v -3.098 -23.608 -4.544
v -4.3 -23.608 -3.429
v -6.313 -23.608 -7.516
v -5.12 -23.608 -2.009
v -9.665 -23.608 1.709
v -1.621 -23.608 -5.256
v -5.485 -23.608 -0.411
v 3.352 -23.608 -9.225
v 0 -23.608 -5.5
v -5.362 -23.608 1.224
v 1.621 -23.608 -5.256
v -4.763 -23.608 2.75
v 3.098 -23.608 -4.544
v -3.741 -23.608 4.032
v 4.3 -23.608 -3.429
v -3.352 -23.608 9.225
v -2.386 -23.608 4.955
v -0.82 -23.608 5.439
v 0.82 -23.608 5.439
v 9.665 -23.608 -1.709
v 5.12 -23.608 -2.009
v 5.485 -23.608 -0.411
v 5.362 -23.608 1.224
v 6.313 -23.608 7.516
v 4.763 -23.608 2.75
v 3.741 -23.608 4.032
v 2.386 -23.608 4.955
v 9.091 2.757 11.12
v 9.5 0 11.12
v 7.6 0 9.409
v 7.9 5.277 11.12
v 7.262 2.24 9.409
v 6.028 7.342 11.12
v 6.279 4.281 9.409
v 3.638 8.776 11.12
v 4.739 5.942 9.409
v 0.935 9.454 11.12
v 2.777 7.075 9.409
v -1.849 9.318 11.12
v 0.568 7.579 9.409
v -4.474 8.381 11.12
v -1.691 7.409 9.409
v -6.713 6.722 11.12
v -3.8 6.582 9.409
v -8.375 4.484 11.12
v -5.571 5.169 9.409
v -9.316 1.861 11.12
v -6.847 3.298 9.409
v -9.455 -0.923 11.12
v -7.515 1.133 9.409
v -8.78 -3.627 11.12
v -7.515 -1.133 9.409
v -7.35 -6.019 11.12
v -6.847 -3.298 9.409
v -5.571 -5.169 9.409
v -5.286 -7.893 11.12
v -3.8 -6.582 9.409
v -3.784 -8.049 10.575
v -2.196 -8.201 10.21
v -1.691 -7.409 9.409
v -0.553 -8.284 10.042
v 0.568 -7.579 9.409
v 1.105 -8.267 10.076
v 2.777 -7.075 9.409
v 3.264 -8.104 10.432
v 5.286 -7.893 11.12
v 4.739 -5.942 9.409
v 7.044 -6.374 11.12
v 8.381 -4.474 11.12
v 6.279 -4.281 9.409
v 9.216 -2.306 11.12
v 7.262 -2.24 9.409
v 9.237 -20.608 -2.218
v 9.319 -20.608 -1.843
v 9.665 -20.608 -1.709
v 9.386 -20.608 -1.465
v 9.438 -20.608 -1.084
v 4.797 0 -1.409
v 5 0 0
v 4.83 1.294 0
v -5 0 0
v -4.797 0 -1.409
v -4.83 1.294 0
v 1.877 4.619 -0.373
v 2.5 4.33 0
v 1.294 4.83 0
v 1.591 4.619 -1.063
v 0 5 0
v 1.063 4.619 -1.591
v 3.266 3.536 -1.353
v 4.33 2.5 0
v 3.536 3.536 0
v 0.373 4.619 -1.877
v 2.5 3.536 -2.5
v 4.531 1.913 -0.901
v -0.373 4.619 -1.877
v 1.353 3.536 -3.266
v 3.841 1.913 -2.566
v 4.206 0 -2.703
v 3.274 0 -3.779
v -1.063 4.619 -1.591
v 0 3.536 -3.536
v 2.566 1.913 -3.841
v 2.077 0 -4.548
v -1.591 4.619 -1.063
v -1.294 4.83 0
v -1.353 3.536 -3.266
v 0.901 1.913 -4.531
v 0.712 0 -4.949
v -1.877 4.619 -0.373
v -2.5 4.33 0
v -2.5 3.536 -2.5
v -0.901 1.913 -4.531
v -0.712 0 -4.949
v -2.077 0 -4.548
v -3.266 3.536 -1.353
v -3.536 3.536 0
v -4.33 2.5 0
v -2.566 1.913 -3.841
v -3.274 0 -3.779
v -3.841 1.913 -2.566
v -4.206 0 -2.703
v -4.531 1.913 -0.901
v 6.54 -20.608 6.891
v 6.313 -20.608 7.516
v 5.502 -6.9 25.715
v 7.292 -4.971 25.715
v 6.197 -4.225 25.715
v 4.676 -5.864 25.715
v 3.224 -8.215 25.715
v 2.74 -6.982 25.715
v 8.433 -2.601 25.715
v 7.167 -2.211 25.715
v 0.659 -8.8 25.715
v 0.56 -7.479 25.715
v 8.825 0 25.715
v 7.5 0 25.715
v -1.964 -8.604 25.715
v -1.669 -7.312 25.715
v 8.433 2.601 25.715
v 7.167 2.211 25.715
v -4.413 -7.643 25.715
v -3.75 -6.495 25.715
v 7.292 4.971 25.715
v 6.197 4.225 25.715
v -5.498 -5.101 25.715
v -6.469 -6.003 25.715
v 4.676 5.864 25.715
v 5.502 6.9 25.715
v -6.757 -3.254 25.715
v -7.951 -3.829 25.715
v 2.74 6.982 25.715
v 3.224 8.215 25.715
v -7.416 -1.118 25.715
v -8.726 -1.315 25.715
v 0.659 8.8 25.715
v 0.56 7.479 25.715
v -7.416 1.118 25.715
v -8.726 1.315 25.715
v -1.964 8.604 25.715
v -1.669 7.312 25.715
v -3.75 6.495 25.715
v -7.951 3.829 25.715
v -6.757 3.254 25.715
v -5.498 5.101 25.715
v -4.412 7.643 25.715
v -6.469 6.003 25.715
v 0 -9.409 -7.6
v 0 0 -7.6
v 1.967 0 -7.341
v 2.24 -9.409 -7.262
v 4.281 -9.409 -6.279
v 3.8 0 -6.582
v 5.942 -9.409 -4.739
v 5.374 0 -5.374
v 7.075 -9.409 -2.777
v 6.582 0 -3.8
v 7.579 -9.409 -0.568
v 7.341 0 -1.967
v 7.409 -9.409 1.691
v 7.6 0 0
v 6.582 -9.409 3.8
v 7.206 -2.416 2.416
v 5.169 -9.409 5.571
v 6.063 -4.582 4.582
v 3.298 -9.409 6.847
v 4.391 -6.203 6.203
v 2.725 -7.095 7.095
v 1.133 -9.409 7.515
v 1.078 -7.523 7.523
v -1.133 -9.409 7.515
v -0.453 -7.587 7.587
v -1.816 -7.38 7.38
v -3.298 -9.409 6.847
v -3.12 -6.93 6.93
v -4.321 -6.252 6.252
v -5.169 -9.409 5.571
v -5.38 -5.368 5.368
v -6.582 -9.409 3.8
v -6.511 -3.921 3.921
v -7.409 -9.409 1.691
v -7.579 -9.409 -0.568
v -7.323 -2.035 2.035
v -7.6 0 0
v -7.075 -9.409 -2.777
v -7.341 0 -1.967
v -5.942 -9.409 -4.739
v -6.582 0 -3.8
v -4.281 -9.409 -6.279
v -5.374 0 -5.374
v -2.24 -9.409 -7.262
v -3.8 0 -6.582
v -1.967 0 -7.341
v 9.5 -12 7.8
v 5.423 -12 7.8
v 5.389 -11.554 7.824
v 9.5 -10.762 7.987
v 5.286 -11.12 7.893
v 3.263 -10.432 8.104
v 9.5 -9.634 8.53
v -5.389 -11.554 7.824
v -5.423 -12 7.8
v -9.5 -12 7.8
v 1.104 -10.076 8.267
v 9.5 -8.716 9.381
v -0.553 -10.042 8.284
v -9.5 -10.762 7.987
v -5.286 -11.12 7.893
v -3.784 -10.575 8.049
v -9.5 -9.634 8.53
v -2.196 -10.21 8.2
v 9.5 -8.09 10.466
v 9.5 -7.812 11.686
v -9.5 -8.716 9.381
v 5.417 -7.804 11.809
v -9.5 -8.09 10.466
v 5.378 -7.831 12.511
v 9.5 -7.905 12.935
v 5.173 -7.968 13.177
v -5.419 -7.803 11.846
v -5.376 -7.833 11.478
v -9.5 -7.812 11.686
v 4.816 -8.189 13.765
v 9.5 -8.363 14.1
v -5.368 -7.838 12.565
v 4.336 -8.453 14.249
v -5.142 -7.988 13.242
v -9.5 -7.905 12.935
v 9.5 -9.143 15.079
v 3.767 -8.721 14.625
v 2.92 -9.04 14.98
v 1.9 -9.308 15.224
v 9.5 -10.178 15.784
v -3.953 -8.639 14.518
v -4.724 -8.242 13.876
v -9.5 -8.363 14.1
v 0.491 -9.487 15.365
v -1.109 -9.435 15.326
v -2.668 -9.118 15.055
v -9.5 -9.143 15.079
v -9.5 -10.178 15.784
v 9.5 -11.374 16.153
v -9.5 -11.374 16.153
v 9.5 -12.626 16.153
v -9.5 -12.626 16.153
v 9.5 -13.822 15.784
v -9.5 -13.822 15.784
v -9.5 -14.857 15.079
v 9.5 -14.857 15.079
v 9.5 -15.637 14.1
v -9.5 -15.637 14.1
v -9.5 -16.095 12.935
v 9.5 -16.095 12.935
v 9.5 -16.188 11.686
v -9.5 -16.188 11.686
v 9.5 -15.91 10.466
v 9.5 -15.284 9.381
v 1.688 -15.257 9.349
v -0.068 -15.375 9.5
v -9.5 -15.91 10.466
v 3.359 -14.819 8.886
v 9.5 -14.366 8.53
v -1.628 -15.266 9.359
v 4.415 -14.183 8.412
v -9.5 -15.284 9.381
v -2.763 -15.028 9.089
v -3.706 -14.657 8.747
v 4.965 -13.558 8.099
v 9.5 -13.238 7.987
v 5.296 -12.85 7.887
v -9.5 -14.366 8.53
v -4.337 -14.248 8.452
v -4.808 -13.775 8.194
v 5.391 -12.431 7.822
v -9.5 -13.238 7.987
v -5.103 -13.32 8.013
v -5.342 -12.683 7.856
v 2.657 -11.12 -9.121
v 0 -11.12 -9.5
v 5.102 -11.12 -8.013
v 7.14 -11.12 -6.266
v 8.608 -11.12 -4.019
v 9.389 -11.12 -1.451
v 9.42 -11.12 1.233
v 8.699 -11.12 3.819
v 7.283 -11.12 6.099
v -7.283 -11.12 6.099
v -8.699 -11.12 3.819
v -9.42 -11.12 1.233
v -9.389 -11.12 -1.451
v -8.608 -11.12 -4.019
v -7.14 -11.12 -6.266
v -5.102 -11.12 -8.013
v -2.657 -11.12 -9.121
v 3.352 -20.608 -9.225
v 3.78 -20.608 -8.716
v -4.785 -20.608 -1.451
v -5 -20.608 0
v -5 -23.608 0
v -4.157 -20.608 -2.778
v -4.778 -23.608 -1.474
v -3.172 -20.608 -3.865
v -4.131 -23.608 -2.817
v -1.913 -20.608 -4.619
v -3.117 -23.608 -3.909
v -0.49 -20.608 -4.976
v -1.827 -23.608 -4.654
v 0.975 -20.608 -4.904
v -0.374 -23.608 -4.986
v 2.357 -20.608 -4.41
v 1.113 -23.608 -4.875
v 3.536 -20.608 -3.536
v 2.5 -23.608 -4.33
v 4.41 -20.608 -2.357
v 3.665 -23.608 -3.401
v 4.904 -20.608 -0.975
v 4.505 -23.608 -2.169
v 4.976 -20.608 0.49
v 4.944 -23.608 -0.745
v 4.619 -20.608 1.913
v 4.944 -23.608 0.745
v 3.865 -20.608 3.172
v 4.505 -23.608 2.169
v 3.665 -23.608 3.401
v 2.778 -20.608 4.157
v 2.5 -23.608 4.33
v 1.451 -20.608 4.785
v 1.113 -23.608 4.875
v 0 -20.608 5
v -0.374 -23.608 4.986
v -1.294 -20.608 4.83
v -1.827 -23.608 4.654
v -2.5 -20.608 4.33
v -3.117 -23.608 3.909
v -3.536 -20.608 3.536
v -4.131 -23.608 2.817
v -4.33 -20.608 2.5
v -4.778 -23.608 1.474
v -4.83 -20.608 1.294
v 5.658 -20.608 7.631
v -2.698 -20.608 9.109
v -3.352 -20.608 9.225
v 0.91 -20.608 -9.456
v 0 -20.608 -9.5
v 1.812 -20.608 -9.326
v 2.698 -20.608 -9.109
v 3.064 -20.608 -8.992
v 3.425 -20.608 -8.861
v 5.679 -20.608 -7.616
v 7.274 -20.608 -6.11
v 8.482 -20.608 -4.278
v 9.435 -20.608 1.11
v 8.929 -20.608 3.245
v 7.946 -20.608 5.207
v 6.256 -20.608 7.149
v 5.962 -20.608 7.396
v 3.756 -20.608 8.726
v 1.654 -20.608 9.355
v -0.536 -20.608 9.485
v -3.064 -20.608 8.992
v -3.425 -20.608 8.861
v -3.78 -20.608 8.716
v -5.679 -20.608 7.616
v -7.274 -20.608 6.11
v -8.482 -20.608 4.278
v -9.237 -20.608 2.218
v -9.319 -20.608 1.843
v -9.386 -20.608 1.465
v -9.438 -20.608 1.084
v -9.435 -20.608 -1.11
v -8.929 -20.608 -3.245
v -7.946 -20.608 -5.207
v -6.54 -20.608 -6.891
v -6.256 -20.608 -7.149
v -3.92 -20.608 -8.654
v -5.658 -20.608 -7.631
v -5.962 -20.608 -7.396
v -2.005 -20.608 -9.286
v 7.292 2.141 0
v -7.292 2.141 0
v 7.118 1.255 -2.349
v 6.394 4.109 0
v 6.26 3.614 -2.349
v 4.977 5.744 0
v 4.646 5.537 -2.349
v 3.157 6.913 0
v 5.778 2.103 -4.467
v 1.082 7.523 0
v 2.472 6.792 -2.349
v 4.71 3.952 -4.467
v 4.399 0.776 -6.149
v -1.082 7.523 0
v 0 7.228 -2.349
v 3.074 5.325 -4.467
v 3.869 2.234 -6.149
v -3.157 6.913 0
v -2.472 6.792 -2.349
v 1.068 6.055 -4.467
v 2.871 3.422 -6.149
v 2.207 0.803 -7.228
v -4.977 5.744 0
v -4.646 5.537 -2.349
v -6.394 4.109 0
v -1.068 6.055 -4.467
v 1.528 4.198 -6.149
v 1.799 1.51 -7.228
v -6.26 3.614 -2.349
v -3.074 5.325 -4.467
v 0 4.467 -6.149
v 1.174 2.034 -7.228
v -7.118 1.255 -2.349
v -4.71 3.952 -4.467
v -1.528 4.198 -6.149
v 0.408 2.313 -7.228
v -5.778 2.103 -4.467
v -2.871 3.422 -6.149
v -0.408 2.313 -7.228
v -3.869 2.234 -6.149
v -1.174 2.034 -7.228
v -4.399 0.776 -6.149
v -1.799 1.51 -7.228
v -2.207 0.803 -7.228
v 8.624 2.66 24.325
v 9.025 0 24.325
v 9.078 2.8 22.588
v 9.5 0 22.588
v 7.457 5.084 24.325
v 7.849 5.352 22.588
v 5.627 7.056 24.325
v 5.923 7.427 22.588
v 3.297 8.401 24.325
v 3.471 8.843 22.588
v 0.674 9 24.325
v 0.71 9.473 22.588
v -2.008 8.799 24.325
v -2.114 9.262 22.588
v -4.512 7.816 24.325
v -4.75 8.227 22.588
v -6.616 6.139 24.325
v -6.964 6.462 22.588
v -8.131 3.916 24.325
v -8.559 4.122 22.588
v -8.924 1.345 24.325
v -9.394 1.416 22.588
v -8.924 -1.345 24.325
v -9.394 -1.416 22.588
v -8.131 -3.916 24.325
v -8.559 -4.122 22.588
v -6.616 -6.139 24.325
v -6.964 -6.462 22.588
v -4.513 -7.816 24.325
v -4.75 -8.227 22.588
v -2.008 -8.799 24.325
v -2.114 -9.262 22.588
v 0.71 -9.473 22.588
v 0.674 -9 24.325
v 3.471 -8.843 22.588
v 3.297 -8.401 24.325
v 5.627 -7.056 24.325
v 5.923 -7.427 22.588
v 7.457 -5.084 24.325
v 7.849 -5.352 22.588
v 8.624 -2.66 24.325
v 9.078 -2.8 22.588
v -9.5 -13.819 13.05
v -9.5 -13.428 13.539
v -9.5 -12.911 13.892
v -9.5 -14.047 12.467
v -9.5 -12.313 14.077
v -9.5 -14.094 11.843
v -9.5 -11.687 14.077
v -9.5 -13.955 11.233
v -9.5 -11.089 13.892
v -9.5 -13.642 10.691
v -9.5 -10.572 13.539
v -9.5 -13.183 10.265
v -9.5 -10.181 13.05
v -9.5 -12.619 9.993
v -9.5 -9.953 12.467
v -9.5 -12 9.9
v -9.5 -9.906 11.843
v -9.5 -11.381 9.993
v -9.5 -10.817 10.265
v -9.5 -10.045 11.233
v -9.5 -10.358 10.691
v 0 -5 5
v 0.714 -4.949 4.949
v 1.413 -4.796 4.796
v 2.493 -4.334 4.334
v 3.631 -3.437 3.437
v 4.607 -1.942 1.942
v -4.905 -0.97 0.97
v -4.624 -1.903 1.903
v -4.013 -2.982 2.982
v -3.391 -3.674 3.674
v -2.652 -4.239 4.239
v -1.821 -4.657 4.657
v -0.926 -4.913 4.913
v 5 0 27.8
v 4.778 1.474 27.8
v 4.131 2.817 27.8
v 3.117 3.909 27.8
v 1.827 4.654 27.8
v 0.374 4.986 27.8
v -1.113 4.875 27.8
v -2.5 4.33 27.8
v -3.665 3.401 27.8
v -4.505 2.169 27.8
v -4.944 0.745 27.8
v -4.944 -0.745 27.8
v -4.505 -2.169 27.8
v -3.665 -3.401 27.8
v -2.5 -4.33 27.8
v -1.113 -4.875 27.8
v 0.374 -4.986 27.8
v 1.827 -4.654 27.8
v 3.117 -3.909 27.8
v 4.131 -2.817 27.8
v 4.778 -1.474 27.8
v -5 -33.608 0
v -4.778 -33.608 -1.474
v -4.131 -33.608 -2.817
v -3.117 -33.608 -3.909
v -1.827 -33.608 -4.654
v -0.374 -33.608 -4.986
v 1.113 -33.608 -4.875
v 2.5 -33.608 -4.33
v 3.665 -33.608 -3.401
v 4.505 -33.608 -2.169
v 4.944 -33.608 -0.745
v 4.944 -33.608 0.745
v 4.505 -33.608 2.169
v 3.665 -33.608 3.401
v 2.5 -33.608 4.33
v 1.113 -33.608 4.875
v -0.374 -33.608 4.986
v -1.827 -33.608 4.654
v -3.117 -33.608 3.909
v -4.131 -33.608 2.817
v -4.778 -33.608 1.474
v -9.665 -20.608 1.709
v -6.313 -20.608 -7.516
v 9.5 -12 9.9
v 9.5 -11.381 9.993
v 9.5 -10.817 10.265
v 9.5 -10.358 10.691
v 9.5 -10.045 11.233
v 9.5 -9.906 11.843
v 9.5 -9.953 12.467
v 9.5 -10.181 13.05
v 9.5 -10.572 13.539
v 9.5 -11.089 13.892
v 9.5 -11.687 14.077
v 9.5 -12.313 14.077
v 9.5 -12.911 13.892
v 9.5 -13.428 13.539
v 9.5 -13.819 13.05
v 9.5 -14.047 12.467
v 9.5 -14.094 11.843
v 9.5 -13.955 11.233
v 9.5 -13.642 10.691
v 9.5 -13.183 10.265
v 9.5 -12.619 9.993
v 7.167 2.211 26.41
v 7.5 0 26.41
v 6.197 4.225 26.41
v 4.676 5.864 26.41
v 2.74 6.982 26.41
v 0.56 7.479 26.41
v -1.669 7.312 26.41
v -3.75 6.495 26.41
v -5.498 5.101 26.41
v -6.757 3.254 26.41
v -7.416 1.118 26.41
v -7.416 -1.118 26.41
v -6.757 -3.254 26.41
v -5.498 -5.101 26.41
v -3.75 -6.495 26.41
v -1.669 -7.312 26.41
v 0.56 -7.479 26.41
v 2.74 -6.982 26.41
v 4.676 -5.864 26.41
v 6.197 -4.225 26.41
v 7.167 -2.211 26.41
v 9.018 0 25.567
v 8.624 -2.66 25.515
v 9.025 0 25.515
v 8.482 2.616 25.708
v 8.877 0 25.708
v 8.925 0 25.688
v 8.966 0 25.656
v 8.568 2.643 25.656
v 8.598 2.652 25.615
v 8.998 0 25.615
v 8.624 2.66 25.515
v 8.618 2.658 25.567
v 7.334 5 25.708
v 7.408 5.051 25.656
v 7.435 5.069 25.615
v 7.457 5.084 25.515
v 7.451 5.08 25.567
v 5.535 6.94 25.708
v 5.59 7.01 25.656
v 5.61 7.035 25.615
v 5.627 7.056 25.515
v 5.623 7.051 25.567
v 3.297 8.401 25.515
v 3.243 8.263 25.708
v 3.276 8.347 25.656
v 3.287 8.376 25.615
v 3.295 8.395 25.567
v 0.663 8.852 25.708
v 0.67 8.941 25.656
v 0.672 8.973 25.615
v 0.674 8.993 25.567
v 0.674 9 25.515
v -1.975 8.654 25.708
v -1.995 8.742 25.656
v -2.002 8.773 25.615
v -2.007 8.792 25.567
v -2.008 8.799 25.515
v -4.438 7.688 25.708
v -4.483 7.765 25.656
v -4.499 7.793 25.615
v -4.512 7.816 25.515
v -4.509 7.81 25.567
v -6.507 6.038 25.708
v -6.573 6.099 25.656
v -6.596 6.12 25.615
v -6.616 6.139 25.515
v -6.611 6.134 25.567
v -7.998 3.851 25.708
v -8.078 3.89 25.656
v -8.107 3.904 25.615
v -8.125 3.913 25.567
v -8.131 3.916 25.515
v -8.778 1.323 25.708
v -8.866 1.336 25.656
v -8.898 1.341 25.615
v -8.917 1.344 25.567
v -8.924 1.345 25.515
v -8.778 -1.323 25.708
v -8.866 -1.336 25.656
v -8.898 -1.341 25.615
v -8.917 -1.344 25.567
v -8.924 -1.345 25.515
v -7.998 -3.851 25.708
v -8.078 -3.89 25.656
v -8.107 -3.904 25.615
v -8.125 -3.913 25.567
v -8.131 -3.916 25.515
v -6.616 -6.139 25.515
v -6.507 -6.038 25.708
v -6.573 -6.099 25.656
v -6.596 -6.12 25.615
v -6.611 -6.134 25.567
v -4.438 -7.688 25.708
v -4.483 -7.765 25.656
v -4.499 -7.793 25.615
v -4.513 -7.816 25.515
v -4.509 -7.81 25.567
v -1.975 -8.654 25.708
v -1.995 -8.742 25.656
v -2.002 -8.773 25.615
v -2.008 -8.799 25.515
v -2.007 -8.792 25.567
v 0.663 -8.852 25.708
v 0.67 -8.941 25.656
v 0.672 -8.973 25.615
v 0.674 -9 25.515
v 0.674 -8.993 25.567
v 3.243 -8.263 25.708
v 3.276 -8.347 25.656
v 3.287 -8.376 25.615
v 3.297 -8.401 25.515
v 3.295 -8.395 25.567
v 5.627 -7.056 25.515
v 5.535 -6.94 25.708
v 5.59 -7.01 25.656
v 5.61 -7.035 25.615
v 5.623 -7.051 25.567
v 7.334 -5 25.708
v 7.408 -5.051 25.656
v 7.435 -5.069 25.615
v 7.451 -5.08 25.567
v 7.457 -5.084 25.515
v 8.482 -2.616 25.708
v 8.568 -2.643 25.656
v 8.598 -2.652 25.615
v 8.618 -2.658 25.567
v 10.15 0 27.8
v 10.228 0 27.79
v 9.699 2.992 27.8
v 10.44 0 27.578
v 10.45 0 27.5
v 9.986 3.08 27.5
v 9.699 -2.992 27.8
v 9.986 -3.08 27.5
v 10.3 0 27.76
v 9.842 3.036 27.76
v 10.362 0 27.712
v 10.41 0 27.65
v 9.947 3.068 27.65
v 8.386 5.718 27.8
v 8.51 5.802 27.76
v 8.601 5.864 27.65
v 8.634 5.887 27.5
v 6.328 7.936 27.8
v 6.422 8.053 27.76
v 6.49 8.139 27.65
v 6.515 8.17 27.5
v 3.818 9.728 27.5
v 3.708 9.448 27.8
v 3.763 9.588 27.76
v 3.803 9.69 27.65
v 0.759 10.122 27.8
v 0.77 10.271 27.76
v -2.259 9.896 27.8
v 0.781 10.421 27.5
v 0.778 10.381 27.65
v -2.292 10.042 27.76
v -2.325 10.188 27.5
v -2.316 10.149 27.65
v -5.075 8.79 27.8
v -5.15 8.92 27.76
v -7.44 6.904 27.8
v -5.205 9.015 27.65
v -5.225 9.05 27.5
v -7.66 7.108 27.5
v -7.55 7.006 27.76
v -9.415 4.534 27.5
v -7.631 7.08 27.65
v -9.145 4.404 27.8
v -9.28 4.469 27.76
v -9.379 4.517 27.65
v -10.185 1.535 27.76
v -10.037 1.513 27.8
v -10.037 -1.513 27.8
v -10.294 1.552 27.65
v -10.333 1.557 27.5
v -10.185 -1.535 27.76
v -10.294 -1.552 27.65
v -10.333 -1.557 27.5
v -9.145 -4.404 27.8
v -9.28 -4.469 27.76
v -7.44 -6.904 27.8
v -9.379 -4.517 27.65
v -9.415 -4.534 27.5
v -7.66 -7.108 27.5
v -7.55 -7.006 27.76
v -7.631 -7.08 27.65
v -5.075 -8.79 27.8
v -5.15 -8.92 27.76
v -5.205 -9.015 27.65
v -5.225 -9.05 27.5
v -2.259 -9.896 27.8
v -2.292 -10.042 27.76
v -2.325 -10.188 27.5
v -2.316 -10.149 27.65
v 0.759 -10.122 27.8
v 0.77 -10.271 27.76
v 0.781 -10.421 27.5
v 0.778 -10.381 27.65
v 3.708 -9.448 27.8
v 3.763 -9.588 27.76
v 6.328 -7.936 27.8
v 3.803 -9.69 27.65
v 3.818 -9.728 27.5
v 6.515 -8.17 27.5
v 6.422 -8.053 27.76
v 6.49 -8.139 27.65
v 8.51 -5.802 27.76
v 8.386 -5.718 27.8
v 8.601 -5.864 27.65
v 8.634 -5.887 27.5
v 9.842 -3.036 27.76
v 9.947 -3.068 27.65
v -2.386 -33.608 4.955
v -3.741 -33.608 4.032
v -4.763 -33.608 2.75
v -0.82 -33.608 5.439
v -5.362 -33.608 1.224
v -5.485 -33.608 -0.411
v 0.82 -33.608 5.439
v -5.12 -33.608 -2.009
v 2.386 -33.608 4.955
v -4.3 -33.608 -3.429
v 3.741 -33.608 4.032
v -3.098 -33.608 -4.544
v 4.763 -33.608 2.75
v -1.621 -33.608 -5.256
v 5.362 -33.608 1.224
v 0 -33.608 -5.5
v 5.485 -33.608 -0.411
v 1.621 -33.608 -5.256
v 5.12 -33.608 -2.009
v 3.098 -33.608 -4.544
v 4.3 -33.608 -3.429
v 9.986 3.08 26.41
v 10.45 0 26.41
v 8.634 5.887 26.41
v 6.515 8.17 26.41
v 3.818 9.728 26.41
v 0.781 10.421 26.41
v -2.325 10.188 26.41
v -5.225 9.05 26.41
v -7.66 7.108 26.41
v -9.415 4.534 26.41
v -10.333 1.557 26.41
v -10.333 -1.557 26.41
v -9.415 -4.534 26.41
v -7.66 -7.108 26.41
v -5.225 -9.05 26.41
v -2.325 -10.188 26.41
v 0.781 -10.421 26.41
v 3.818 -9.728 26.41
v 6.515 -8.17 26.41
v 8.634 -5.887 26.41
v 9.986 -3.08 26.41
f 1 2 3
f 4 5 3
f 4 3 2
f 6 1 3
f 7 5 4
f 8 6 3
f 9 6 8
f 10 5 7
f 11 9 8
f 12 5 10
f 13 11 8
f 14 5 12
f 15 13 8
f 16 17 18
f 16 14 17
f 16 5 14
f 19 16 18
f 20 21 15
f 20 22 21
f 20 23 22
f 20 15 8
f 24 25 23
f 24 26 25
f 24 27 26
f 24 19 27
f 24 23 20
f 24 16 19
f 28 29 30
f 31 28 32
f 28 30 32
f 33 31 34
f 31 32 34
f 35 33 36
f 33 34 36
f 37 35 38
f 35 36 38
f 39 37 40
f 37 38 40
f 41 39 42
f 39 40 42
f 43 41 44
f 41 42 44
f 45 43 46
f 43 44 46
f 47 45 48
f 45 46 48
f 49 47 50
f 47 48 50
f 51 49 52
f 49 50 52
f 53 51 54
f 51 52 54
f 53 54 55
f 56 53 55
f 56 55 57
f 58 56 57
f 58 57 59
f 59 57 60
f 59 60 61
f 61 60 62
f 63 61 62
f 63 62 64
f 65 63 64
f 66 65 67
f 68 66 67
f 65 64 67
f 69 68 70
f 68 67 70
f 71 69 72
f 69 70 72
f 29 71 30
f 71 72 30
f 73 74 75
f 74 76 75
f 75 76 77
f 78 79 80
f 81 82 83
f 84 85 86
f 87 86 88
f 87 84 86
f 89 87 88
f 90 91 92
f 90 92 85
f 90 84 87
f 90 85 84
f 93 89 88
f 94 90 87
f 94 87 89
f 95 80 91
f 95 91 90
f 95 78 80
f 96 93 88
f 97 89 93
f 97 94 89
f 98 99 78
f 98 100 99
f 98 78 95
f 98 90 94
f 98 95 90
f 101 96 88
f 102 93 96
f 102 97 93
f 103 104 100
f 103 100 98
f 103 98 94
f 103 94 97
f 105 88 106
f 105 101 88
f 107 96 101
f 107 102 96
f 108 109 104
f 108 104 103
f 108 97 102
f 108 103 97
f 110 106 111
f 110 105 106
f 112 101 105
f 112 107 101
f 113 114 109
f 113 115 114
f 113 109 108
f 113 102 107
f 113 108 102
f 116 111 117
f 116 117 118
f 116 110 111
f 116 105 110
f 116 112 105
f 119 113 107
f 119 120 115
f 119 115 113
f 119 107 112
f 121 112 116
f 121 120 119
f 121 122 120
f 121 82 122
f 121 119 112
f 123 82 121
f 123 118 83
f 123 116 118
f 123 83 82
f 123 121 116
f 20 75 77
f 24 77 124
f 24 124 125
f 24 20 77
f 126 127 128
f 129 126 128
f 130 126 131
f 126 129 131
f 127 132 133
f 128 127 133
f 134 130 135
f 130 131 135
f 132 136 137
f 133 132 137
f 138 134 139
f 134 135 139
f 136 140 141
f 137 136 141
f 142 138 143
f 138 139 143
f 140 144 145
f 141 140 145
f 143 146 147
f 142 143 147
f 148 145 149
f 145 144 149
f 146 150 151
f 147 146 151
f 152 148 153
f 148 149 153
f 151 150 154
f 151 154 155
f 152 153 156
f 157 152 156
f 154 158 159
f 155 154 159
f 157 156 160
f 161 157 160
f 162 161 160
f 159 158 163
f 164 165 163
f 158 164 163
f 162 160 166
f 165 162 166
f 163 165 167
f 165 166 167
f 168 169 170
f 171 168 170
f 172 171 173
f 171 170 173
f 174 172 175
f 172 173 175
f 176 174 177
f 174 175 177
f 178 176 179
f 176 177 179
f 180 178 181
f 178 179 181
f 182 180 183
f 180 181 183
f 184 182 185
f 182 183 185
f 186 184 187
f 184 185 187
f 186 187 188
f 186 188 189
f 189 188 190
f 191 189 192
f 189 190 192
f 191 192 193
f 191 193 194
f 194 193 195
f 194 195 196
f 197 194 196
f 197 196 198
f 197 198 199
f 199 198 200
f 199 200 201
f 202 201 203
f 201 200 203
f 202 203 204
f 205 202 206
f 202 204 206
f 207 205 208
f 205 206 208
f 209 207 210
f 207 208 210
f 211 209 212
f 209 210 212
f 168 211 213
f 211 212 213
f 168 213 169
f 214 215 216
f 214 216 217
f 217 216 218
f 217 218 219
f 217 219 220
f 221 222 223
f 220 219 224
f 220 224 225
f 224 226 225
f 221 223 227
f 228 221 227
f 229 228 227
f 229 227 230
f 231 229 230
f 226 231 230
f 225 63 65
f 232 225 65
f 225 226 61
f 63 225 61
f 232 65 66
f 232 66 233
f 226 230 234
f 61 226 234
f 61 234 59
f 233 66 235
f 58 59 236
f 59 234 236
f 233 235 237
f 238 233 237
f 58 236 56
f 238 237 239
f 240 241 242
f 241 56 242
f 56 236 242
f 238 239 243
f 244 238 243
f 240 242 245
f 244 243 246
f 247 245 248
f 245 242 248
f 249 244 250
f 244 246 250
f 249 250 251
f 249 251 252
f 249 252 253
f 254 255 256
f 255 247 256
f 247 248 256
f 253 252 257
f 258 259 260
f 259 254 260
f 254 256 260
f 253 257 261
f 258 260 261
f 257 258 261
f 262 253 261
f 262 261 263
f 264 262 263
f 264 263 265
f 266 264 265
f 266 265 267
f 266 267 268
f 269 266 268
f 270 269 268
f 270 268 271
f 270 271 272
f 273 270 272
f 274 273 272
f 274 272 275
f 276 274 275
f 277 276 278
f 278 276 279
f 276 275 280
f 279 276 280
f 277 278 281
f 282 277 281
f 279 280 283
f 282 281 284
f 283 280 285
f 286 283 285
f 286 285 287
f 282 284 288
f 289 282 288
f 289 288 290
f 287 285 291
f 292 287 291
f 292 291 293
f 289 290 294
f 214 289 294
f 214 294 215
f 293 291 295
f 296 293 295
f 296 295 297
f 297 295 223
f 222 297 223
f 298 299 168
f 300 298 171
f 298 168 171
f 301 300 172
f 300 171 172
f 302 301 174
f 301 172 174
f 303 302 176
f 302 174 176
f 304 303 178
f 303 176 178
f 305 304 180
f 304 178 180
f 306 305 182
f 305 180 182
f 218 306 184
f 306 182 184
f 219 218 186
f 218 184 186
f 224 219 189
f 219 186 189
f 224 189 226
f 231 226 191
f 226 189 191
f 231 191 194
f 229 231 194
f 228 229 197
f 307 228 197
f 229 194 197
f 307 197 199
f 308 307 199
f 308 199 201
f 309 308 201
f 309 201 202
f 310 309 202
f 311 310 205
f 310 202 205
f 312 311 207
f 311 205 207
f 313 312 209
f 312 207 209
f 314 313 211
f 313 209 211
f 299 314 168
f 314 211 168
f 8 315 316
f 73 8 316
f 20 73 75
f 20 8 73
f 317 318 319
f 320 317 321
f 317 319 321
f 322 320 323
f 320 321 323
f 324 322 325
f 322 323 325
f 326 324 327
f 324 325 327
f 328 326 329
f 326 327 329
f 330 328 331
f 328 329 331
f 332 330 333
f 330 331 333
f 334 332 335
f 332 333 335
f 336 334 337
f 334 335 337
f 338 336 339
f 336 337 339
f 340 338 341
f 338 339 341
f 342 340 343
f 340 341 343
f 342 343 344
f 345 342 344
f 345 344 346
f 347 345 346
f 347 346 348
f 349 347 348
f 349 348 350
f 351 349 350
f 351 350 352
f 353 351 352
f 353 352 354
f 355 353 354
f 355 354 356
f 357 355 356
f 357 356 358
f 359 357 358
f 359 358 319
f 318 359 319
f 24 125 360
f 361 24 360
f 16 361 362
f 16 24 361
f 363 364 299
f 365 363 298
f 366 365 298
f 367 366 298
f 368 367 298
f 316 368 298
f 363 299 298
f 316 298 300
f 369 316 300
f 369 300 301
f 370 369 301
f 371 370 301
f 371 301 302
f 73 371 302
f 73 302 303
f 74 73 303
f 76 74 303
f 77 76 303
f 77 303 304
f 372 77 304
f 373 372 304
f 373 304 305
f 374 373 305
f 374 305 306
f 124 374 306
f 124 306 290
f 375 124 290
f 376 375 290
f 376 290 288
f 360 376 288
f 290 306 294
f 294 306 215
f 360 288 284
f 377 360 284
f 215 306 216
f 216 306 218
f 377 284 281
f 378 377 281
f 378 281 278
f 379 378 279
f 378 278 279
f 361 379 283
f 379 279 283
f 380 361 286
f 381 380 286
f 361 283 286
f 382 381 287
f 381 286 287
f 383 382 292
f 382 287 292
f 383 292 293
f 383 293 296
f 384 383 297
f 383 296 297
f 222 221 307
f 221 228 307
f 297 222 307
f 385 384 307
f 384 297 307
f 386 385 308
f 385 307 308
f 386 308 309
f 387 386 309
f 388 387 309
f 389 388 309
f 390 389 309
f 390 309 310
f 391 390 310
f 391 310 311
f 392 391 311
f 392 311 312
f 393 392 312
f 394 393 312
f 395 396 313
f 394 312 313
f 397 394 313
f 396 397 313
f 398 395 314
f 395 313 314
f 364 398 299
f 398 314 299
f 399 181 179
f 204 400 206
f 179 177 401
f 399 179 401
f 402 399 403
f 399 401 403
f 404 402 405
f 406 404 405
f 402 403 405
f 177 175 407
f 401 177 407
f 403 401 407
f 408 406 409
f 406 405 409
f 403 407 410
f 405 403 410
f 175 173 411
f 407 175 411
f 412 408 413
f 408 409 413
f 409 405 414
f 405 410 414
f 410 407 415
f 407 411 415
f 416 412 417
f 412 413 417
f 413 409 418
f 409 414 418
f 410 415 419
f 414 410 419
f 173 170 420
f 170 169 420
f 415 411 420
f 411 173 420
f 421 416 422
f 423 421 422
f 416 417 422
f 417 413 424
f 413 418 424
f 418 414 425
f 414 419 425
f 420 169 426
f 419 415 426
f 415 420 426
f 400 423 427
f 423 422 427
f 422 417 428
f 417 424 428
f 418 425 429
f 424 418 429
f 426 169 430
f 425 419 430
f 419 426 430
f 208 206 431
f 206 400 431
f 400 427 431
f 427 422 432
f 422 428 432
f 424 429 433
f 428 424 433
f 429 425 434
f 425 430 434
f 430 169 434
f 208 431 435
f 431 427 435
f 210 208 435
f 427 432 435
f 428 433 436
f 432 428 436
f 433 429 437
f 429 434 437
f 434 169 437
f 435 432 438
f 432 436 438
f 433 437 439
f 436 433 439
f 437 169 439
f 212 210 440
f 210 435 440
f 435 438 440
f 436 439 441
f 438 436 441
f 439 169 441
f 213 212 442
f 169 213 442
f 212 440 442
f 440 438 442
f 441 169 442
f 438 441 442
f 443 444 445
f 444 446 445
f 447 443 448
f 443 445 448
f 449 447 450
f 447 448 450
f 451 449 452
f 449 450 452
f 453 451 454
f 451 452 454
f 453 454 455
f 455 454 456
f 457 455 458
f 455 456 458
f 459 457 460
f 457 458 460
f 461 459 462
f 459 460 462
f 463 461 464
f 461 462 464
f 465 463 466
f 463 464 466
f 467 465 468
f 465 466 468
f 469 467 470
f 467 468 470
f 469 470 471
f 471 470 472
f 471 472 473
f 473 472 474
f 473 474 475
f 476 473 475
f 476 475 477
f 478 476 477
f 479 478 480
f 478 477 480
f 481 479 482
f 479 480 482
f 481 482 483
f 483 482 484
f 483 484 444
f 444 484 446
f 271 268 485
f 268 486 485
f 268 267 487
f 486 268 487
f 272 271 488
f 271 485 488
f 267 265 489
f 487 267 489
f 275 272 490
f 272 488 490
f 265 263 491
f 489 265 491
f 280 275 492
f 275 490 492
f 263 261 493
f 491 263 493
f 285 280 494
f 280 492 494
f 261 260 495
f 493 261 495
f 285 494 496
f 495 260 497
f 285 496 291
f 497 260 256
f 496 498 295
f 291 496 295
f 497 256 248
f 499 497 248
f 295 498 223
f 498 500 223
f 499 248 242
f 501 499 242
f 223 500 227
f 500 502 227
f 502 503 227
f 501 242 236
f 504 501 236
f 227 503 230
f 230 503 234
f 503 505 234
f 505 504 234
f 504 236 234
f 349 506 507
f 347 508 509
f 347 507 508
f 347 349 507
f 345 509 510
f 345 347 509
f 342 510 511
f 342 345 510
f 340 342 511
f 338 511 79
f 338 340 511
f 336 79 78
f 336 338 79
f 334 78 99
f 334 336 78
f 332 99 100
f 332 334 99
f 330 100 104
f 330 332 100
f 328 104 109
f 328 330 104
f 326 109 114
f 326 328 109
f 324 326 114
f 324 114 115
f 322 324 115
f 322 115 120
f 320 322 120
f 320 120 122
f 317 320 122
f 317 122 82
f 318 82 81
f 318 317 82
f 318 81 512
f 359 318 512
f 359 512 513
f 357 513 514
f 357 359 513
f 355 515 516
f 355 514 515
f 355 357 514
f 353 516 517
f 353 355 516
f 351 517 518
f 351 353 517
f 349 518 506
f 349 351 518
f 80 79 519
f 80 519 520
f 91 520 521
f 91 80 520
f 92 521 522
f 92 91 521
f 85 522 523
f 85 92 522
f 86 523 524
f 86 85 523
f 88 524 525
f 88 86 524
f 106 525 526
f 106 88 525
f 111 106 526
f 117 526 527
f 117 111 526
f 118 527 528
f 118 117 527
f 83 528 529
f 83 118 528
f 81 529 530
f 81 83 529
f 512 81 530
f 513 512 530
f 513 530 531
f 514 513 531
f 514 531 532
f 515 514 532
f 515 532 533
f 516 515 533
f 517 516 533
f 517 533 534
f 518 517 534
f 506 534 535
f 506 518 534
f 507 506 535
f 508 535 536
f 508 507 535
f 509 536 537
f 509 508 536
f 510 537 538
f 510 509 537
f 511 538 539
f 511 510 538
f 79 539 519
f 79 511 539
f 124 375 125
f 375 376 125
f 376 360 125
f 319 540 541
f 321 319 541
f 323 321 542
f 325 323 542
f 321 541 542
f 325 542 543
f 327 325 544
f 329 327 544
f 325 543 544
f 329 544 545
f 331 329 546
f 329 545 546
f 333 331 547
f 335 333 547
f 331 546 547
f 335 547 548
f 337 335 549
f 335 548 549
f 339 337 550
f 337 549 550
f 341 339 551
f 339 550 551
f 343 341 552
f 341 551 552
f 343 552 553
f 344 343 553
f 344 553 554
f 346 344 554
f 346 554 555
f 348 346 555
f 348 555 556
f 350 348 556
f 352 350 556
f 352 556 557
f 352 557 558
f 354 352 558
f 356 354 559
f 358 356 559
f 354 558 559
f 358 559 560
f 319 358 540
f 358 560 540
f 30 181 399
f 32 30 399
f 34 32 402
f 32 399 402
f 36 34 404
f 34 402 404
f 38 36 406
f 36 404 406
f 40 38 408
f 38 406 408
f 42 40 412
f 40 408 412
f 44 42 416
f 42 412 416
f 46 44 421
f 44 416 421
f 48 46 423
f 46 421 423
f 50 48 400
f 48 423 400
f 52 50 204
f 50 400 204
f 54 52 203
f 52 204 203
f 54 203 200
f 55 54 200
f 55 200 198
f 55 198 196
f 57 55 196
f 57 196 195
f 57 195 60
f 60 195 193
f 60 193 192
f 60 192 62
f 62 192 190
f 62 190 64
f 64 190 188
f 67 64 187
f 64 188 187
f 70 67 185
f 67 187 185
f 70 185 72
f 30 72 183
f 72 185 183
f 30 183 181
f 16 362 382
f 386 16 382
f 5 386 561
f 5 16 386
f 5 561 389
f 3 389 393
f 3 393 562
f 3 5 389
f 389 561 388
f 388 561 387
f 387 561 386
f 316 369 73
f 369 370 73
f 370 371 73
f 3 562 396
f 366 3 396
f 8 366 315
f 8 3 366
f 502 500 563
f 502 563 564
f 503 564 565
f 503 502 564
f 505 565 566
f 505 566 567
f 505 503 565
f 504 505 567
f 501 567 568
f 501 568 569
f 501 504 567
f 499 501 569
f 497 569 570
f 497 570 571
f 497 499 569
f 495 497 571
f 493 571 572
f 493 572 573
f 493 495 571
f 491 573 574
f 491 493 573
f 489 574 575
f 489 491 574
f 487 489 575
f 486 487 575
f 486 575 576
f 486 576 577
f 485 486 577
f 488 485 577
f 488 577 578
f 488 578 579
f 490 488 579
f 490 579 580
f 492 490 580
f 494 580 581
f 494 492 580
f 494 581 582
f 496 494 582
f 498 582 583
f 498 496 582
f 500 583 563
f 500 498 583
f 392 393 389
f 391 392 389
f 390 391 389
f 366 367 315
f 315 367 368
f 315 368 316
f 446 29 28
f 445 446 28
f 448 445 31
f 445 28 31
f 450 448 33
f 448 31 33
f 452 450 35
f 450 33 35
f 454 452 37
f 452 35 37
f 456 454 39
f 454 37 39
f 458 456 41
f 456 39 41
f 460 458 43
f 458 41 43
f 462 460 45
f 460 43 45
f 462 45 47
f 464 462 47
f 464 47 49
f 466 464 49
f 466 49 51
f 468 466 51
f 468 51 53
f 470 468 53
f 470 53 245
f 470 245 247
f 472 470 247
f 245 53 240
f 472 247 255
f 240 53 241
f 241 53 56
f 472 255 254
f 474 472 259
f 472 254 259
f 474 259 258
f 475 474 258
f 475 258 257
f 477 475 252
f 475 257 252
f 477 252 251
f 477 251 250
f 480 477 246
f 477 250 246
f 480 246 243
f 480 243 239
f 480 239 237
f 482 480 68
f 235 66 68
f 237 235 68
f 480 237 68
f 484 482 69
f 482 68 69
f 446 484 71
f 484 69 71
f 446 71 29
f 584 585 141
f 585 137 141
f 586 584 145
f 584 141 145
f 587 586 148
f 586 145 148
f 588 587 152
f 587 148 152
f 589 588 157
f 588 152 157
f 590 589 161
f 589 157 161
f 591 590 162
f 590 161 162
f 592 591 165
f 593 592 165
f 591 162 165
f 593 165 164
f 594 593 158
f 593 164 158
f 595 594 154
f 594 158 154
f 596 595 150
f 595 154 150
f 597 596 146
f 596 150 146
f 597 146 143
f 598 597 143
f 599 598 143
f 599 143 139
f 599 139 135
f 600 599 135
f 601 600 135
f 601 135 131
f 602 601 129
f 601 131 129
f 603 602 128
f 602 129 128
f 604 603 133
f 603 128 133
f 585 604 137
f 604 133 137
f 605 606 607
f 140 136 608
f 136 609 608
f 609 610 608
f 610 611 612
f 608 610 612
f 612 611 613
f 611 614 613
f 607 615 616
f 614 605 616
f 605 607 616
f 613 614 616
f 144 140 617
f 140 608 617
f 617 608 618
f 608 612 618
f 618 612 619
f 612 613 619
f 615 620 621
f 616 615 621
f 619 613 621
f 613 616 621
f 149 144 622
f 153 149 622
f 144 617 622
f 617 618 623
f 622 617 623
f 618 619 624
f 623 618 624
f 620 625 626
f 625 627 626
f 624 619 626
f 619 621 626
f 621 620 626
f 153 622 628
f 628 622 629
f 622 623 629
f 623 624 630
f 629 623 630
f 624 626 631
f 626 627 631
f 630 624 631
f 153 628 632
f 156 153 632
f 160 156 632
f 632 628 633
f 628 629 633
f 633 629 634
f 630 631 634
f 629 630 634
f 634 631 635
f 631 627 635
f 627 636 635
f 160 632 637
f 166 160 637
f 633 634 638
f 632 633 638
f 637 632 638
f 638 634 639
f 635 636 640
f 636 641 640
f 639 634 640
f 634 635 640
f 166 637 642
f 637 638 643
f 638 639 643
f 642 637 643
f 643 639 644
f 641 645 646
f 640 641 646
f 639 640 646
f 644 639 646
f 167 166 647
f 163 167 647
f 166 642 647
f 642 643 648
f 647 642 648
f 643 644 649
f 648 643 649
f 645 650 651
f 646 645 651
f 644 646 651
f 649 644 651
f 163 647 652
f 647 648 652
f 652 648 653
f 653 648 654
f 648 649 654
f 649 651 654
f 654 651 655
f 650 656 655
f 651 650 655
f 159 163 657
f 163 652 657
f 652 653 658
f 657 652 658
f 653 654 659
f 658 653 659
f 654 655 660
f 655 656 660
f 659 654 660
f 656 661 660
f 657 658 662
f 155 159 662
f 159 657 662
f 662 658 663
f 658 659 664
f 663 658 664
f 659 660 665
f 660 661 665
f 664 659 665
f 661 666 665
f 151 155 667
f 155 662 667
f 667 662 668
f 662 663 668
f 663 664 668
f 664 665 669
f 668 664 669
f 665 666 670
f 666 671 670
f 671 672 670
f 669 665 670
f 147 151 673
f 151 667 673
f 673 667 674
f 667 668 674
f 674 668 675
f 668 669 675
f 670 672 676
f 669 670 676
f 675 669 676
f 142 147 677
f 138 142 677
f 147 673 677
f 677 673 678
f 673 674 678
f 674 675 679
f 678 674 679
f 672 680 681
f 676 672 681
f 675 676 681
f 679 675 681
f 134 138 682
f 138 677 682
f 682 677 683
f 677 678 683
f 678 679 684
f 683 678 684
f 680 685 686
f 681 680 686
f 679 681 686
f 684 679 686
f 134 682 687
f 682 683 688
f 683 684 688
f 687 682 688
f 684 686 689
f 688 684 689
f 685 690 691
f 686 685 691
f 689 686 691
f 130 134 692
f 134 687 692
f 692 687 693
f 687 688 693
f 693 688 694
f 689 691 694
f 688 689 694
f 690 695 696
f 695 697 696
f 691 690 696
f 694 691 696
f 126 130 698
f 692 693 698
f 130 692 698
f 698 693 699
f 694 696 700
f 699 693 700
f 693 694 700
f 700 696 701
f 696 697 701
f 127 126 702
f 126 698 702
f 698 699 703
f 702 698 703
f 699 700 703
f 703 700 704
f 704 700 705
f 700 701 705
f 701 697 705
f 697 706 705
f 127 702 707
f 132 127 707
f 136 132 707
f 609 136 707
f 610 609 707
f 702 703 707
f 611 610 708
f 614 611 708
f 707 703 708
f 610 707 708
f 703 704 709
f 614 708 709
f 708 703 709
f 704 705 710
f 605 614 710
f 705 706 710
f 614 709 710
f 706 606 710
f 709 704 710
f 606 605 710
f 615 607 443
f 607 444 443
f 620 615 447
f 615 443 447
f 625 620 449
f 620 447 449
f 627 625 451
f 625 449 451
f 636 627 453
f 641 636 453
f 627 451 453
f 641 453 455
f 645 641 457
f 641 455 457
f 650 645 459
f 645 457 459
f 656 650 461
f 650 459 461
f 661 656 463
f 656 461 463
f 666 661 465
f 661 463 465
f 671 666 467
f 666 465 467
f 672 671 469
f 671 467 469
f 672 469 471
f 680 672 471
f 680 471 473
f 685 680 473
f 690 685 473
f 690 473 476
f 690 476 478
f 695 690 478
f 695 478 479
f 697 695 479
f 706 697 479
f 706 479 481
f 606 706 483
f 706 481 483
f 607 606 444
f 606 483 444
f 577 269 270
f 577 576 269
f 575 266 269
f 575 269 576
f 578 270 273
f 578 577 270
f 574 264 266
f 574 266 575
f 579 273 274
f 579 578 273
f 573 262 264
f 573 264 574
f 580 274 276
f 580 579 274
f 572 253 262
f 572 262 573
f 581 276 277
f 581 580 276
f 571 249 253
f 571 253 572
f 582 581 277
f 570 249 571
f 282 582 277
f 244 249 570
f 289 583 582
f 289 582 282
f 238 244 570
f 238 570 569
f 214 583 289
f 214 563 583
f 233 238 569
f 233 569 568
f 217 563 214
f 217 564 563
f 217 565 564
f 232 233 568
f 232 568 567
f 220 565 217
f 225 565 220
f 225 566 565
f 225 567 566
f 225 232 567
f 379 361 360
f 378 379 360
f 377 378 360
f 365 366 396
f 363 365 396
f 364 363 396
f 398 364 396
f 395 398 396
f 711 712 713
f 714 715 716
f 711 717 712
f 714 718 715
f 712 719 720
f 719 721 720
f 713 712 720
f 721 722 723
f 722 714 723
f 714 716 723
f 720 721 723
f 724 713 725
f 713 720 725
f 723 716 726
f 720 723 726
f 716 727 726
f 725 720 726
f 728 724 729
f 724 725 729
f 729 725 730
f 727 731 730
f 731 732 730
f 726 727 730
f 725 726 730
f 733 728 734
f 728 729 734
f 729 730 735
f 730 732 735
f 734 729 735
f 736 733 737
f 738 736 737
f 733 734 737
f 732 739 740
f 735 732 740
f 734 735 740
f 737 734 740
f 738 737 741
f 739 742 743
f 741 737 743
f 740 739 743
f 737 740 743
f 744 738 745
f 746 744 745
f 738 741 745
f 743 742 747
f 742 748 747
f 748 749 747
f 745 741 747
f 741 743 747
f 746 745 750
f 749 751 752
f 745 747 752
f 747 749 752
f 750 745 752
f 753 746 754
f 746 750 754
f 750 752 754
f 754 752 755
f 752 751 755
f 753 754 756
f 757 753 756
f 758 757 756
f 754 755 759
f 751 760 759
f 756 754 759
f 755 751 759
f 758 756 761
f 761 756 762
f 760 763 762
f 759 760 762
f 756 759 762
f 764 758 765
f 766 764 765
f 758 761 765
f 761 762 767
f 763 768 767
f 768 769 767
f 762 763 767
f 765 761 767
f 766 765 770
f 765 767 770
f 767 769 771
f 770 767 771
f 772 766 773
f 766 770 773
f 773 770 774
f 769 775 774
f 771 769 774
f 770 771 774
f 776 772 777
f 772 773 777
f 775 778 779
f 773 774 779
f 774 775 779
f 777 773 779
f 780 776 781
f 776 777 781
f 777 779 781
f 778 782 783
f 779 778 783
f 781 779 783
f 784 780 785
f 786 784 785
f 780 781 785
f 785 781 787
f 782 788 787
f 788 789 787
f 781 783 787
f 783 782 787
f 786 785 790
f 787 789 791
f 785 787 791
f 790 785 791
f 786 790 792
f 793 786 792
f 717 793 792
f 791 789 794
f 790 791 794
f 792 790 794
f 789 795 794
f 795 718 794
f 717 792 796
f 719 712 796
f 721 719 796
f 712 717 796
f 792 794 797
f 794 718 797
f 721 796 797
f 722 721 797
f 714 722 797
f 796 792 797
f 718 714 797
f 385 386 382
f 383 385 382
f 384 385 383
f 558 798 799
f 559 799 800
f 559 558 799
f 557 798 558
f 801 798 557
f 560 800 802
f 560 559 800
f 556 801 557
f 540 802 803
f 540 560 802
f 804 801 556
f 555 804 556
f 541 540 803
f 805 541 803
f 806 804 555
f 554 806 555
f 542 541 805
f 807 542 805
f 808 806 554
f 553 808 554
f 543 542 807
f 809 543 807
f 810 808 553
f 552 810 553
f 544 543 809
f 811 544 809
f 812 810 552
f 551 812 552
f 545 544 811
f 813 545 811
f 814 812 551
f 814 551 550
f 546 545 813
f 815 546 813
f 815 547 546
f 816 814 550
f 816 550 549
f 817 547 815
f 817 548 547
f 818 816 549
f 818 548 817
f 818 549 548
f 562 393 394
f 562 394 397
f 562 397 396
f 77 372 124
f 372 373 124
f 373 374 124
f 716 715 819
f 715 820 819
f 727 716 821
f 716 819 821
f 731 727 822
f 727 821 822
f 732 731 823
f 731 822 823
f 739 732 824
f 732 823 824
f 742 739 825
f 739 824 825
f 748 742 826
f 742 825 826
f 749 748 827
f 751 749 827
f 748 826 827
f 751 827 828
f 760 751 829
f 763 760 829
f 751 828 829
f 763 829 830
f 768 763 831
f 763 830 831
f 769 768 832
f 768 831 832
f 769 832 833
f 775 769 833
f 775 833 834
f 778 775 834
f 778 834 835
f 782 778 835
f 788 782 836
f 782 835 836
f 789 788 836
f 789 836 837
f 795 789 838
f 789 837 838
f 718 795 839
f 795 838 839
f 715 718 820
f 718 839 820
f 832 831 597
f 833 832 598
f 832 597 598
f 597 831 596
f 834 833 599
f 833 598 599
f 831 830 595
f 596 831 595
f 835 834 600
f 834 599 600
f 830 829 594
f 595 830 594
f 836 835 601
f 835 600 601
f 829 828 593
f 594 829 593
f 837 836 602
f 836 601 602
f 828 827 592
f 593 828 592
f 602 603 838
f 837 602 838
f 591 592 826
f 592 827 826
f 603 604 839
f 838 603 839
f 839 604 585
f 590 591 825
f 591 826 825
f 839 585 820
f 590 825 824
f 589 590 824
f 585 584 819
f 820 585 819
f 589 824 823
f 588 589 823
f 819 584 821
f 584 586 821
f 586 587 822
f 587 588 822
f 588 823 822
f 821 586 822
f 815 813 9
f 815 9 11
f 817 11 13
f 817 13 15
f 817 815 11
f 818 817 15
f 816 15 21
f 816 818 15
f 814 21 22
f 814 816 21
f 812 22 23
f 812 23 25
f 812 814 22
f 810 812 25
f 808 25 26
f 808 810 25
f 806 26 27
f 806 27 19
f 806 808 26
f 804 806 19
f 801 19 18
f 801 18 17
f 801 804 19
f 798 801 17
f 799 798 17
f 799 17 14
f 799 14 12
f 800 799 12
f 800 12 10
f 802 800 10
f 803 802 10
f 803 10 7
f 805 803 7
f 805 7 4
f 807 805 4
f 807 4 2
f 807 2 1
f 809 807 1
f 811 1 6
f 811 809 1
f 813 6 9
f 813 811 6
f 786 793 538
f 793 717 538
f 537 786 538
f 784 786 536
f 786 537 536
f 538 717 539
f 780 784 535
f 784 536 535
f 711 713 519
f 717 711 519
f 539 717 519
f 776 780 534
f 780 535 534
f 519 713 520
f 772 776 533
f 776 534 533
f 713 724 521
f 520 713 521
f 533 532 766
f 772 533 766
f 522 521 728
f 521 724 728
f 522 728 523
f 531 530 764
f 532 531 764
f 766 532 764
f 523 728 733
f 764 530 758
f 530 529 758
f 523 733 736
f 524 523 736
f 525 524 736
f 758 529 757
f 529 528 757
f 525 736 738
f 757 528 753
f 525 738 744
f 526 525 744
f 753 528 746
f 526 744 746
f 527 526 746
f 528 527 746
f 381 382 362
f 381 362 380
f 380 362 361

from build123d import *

# Parameters (mm, degrees)
SKETCH_3_R               = 5
CUT_EXTRUDE_1_DEPTH      = 27.8
EXTRUDE_1_DEPTH          = 9.5
EXTRUDE_1_DEPTH_BACK     = 9.5
SKETCH_5_R               = 4.2
CUT_EXTRUDE_2_DEPTH      = 9.5
CUT_EXTRUDE_2_DEPTH_BACK = 9.5
SKETCH_6_R               = 2.1
EXTRUDE_START            = 3
SKETCH_7_R               = 5
EXTRUDE_2_DEPTH          = 3
EXTRUDE_START_2          = 10
SKETCH_8_R               = 5.5
SKETCH_8_R_2             = 5
EXTRUDE_3_DEPTH          = 10


with BuildPart() as part:
    # 草图1 → 旋转1 (revolve)
    with BuildSketch(Plane(origin=(0, 0, 0), x_dir=(0, 0, -1), z_dir=(1, 0, 0))):
        with BuildLine():
            Line((-27.8, 0), (-27.8, 10.15))
            ThreePointArc((-27.8, 10.15), (-27.712132034, 10.362132034), (-27.5, 10.45))
            Line((-27.5, 10.45), (-26.41, 10.45))
            Line((-26.41, 10.45), (-26.41, 7.5))
            Line((-26.41, 7.5), (-25.715, 7.5))
            Line((-25.715, 7.5), (-25.715, 8.825))
            ThreePointArc((-25.715, 8.825), (-25.656421356, 8.966421356), (-25.515, 9.025))
            Line((-25.515, 9.025), (-24.325, 9.025))
            Line((-24.325, 9.025), (-22.5875, 9.5))
            Line((-22.5875, 9.5), (-11.12, 9.5))
            Line((-11.12, 9.5), (-9.409232316, 7.6))
            Line((-9.409232316, 7.6), (0, 7.6))
            ThreePointArc((0, 7.6), (5.374011537, 5.374011537), (7.6, 0))
            Line((7.6, 0), (-27.8, 0))
        make_face()
    revolve(axis=Axis((0, 0, -7.6), (0, 0, 1)))

    # 草图2 → 旋转2 (revolve)
    with BuildSketch(Plane(origin=(0, 0, 0), x_dir=(0, 0, -1), z_dir=(1, 0, 0))):
        Polygon((-9.5, -20.608198383), (-9.5, -11.12), (-7.6, -9.409232316), (-7.6, 0), (0, 0), (0, -20.608198383), align=None)
    revolve(axis=Axis((0, 0, 0), (0, -1, 0)))

    # 草图3 → 切除-拉伸1 (cut)
    with BuildSketch(Plane.XY):
        Circle(SKETCH_3_R)
    extrude(amount=CUT_EXTRUDE_1_DEPTH, mode=Mode.SUBTRACT)

    # 草图4 → 切除-旋转1 (revolve, cut)
    with BuildSketch(Plane(origin=(0, 0, 0), x_dir=(0, 0, -1), z_dir=(1, 0, 0))):
        with BuildLine():
            Line((5, 0), (5, -27.8))
            Line((5, -27.8), (0, -27.8))
            Line((0, -27.8), (0, 5))
            ThreePointArc((0, 5), (3.535533906, 3.535533906), (5, 0))
        make_face()
    revolve(axis=Axis((0, -27.8, 0), (0, 1, 0)), mode=Mode.SUBTRACT)

    # 草图5 → 凸台-拉伸1 (add, two sides: drawn at the far end of the back side and taken through both)
    with BuildSketch(Plane(origin=(0, 0, 0), x_dir=(0, 0, -1), z_dir=(1, 0, 0)).offset(-EXTRUDE_1_DEPTH_BACK)):
        with Locations((-12, -12)):
            Circle(SKETCH_5_R)
    extrude(amount=EXTRUDE_1_DEPTH + EXTRUDE_1_DEPTH_BACK)

    # 草图6 → 切除-拉伸2 (cut, two sides: drawn at the far end of the back side and taken through both)
    with BuildSketch(Plane(origin=(0, 0, 0), x_dir=(0, 0, -1), z_dir=(1, 0, 0)).offset(-CUT_EXTRUDE_2_DEPTH_BACK)):
        with Locations((-12, -12)):
            Circle(SKETCH_6_R)
    extrude(amount=CUT_EXTRUDE_2_DEPTH + CUT_EXTRUDE_2_DEPTH_BACK, mode=Mode.SUBTRACT)

    # 草图7 → 凸台-拉伸2 (add)
    with BuildSketch(Plane.XZ.offset(20.608198383).offset(EXTRUDE_START)):
        Polygon((-6.312687887, -7.51553757), (3.352302515, -9.224716862), (9.664990403, -1.709179291), (6.312687887, 7.51553757), (-3.352302515, 9.224716862), (-9.664990403, 1.709179291), align=None)
        Circle(SKETCH_7_R, mode=Mode.SUBTRACT)
    extrude(amount=-EXTRUDE_2_DEPTH)

    # 草图8 → 凸台-拉伸3 (add)
    with BuildSketch(Plane.XZ.offset(23.608198383).offset(EXTRUDE_START_2)):
        Circle(SKETCH_8_R)
        Circle(SKETCH_8_R_2, mode=Mode.SUBTRACT)
    extrude(amount=-EXTRUDE_3_DEPTH)


solid = part.part
